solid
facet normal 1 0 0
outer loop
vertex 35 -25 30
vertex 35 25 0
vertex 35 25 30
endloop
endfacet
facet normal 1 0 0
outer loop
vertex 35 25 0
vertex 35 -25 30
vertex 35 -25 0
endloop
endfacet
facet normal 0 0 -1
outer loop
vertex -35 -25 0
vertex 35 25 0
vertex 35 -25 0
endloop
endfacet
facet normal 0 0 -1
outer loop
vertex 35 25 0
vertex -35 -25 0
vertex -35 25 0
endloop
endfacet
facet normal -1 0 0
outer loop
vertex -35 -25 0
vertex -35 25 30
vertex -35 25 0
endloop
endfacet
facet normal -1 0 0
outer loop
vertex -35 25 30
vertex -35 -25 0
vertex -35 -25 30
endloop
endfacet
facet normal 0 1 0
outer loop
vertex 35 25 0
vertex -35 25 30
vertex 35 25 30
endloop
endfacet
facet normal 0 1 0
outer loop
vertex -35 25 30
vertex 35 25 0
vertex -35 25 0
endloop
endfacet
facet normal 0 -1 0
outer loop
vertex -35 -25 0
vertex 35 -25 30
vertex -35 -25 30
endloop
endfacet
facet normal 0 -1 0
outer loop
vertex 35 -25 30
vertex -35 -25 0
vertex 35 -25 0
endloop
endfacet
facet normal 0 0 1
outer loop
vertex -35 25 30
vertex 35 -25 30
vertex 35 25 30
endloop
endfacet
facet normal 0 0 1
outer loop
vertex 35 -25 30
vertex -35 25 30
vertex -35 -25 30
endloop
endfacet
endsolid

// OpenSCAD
// Two-part enclosure for a small electronics board (e.g., Arduino-based temperature logger)
// Print orientation: both parts on the bed, side by side, with a 10 mm gap.
// Part 1: box (open top). Part 2: lid (printed upside down).

$fn = 64;

// ---- Box dimensions ----
box_x = 70;    // outer size in X (mm)
box_y = 50;    // outer size in Y (mm)
box_z = 30;    // outer size in Z (mm)
wall  = 2;     // wall thickness (mm)
floor = 2;     // floor thickness (mm)

// ---- Lid dimensions ----
lip_w = 65.6;  // lip outer size in X (mm)
lip_d = 45.6;  // lip outer size in Y (mm)
lip_h = 1.5;   // lip thickness (mm)
plate = 4;     // lid plate thickness (mm)

// ---- Misc ----
gap   = 10;    // gap between box and lid (mm)
eps   = 0.2;   // clearance / overshoot (mm)

// Box (open top)
module box() {
    translate([-box_x/2, -box_y/2, 0])
        cube([box_x, box_y, floor]);
    translate([-box_x/2, -box_y/2, floor])
        cube([box_x, box_y, box_z - floor - wall]);
    translate([-box_x/2, -box_y/2, box_z - wall])
        cube([box_x, box_y, wall]);
}

// Lid: plate on the bed, lip on top of it
module lid() {
    translate([-lip_w/2, -lip_d/2, 0])
        cube([lip_w, lip_d, plate]);
    translate([-lip_w/2, -lip_d/2, plate])
        cube([lip_w, lip_d, lip_h]);
}

union() {
    box();
    translate([0, 0, 0]) lid();
    // gap between parts is maintained by their positions
}
